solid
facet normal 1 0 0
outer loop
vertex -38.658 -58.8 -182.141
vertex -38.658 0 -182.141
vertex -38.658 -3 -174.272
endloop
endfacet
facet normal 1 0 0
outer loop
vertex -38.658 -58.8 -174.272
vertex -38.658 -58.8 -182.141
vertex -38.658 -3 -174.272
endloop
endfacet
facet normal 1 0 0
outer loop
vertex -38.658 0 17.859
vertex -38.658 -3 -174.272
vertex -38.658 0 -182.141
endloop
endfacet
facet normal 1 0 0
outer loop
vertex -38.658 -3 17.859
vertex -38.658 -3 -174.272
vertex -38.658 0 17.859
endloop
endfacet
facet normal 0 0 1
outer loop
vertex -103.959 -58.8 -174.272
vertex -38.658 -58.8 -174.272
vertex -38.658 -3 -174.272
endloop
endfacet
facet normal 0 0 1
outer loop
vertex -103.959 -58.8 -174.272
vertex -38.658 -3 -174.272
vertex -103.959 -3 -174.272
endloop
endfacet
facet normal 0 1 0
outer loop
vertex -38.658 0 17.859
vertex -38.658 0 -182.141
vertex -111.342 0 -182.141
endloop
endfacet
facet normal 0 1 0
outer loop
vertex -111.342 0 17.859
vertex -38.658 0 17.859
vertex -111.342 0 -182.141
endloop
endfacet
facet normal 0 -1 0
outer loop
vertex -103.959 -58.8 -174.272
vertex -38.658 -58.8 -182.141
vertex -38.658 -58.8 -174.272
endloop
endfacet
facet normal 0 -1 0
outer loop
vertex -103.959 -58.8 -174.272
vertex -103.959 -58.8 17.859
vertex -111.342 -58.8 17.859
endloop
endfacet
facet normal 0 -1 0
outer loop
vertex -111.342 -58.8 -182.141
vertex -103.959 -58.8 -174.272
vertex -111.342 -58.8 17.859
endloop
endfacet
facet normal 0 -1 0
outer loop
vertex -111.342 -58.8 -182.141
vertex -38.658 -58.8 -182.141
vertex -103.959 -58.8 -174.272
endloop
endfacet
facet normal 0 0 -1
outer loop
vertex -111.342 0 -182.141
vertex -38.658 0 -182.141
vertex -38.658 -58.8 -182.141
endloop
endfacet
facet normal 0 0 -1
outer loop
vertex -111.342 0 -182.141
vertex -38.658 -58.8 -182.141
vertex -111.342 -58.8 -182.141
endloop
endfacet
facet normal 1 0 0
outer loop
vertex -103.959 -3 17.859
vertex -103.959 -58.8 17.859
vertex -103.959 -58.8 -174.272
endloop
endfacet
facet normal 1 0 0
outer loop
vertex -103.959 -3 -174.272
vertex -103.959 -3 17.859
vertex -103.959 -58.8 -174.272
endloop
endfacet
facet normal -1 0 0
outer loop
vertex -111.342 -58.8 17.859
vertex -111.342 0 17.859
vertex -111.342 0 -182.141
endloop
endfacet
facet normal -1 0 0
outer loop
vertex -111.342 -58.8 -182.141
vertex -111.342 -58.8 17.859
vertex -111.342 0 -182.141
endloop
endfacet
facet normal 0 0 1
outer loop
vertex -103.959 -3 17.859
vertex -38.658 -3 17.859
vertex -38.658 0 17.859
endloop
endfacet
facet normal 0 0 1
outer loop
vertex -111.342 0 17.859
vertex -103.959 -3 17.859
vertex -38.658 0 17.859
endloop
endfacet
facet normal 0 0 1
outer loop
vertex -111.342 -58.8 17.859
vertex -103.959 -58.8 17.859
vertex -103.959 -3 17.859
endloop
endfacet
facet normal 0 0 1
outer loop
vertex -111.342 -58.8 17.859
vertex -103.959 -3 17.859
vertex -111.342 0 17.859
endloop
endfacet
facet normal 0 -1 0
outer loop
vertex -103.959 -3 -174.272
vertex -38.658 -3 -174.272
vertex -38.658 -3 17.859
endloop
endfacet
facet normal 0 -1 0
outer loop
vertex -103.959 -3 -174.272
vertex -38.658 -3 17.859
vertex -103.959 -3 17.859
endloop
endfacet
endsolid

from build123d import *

# Parameters (mm, degrees)
SKETCH1_R           = 28.1
BOSS_EXTRUDE1_DEPTH = 1
SKETCH2_R           = 18.6
CUT_EXTRUDE1_DEPTH  = 58.8
SKETCH3_W           = 222.683092022
SKETCH3_H           = 364.2827524
BOSS_EXTRUDE2_DEPTH = 58.8
SKETCH4_W           = 207.917403516
SKETCH4_H           = 348.54429772
CUT_EXTRUDE2_DEPTH  = 55.8
SKETCH9_R           = 3
CUT_EXTRUDE8_DEPTH  = 10
SKETCH10_R          = 3.75
CUT_EXTRUDE9_DEPTH  = 10
CUT_EXTRUDE12_DEPTH = 500
SKETCH6_R           = 3.75
CUT_EXTRUDE5_DEPTH  = 400
SKETCH8_R           = 10
CUT_EXTRUDE7_DEPTH  = 10


with BuildPart() as part:
    # Sketch1 → Boss-Extrude1 (new body)
    with BuildSketch(Plane(origin=(0, 0, 0), x_dir=(1, 0, 0), z_dir=(0, 1, 0))):
        Circle(SKETCH1_R)
    extrude(amount=BOSS_EXTRUDE1_DEPTH)

    # Sketch2 → Cut-Extrude1 (cut)
    with BuildSketch(Plane(origin=(0, 1, 0), x_dir=(1, 0, 0), z_dir=(0, 1, 0))):
        with Locations((0, -7)):
            Circle(SKETCH2_R)
    extrude(amount=-CUT_EXTRUDE1_DEPTH, mode=Mode.SUBTRACT)

    # Sketch3 → Boss-Extrude2 (add)
    with BuildSketch(Plane(origin=(0, 0, 0), x_dir=(-1, 0, 0), z_dir=(0, -1, 0))):
        Rectangle(SKETCH3_W, SKETCH3_H)
    extrude(amount=BOSS_EXTRUDE2_DEPTH)

    # Sketch4 → Cut-Extrude2 (cut)
    with BuildSketch(Plane(origin=(0, -58.8, 0), x_dir=(-1, 0, 0), z_dir=(0, -1, 0))):
        Rectangle(SKETCH4_W, SKETCH4_H)
    extrude(amount=-CUT_EXTRUDE2_DEPTH, mode=Mode.SUBTRACT)

    # Sketch9 → Cut-Extrude8 (cut)
    with BuildSketch(Plane(origin=(0, 0, 0), x_dir=(1, 0, 0), z_dir=(0, 1, 0))):
        with Locations((0, -7)):
            Circle(SKETCH9_R)
    extrude(amount=-CUT_EXTRUDE8_DEPTH, mode=Mode.SUBTRACT)

    # Sketch10 → Cut-Extrude9 (cut)
    with BuildSketch(Plane(origin=(0, 1, 0), x_dir=(1, 0, 0), z_dir=(0, 1, 0))):
        with Locations((0, 19.85)):
            Circle(SKETCH10_R)
    extrude(amount=-CUT_EXTRUDE9_DEPTH, mode=Mode.SUBTRACT)

    # Sketch11 → Cut-Extrude12 (cut)
    with BuildSketch(Plane(origin=(0, -58.8, 0), x_dir=(-1, 0, 0), z_dir=(0, -1, 0))):
        Polygon((38.658453989, -17.8586238), (111.341546011, -17.8586238), (111.341546011, -182.1413762), (-111.341546011, -182.1413762), (-111.341546011, 182.1413762), (38.658453989, 182.1413762), align=None)
    extrude(amount=-CUT_EXTRUDE12_DEPTH, mode=Mode.SUBTRACT)

    # Sketch6 → Cut-Extrude5 (cut)
    with BuildSketch(Plane(origin=(0, 1, 0), x_dir=(1, 0, 0), z_dir=(0, 1, 0))):
        with Locations((0, 18.75)):
            Circle(SKETCH6_R)
    extrude(amount=-CUT_EXTRUDE5_DEPTH, mode=Mode.SUBTRACT)

    # Sketch8 → Cut-Extrude7 (cut)
    with BuildSketch(Plane(origin=(0, 0, -182.1413762), x_dir=(-1, 0, 0), z_dir=(0, 0, -1))):
        with Locations((-86.573671766, -25.011155335)):
            Circle(SKETCH8_R)
    extrude(amount=-CUT_EXTRUDE7_DEPTH, mode=Mode.SUBTRACT)


solid = part.part
